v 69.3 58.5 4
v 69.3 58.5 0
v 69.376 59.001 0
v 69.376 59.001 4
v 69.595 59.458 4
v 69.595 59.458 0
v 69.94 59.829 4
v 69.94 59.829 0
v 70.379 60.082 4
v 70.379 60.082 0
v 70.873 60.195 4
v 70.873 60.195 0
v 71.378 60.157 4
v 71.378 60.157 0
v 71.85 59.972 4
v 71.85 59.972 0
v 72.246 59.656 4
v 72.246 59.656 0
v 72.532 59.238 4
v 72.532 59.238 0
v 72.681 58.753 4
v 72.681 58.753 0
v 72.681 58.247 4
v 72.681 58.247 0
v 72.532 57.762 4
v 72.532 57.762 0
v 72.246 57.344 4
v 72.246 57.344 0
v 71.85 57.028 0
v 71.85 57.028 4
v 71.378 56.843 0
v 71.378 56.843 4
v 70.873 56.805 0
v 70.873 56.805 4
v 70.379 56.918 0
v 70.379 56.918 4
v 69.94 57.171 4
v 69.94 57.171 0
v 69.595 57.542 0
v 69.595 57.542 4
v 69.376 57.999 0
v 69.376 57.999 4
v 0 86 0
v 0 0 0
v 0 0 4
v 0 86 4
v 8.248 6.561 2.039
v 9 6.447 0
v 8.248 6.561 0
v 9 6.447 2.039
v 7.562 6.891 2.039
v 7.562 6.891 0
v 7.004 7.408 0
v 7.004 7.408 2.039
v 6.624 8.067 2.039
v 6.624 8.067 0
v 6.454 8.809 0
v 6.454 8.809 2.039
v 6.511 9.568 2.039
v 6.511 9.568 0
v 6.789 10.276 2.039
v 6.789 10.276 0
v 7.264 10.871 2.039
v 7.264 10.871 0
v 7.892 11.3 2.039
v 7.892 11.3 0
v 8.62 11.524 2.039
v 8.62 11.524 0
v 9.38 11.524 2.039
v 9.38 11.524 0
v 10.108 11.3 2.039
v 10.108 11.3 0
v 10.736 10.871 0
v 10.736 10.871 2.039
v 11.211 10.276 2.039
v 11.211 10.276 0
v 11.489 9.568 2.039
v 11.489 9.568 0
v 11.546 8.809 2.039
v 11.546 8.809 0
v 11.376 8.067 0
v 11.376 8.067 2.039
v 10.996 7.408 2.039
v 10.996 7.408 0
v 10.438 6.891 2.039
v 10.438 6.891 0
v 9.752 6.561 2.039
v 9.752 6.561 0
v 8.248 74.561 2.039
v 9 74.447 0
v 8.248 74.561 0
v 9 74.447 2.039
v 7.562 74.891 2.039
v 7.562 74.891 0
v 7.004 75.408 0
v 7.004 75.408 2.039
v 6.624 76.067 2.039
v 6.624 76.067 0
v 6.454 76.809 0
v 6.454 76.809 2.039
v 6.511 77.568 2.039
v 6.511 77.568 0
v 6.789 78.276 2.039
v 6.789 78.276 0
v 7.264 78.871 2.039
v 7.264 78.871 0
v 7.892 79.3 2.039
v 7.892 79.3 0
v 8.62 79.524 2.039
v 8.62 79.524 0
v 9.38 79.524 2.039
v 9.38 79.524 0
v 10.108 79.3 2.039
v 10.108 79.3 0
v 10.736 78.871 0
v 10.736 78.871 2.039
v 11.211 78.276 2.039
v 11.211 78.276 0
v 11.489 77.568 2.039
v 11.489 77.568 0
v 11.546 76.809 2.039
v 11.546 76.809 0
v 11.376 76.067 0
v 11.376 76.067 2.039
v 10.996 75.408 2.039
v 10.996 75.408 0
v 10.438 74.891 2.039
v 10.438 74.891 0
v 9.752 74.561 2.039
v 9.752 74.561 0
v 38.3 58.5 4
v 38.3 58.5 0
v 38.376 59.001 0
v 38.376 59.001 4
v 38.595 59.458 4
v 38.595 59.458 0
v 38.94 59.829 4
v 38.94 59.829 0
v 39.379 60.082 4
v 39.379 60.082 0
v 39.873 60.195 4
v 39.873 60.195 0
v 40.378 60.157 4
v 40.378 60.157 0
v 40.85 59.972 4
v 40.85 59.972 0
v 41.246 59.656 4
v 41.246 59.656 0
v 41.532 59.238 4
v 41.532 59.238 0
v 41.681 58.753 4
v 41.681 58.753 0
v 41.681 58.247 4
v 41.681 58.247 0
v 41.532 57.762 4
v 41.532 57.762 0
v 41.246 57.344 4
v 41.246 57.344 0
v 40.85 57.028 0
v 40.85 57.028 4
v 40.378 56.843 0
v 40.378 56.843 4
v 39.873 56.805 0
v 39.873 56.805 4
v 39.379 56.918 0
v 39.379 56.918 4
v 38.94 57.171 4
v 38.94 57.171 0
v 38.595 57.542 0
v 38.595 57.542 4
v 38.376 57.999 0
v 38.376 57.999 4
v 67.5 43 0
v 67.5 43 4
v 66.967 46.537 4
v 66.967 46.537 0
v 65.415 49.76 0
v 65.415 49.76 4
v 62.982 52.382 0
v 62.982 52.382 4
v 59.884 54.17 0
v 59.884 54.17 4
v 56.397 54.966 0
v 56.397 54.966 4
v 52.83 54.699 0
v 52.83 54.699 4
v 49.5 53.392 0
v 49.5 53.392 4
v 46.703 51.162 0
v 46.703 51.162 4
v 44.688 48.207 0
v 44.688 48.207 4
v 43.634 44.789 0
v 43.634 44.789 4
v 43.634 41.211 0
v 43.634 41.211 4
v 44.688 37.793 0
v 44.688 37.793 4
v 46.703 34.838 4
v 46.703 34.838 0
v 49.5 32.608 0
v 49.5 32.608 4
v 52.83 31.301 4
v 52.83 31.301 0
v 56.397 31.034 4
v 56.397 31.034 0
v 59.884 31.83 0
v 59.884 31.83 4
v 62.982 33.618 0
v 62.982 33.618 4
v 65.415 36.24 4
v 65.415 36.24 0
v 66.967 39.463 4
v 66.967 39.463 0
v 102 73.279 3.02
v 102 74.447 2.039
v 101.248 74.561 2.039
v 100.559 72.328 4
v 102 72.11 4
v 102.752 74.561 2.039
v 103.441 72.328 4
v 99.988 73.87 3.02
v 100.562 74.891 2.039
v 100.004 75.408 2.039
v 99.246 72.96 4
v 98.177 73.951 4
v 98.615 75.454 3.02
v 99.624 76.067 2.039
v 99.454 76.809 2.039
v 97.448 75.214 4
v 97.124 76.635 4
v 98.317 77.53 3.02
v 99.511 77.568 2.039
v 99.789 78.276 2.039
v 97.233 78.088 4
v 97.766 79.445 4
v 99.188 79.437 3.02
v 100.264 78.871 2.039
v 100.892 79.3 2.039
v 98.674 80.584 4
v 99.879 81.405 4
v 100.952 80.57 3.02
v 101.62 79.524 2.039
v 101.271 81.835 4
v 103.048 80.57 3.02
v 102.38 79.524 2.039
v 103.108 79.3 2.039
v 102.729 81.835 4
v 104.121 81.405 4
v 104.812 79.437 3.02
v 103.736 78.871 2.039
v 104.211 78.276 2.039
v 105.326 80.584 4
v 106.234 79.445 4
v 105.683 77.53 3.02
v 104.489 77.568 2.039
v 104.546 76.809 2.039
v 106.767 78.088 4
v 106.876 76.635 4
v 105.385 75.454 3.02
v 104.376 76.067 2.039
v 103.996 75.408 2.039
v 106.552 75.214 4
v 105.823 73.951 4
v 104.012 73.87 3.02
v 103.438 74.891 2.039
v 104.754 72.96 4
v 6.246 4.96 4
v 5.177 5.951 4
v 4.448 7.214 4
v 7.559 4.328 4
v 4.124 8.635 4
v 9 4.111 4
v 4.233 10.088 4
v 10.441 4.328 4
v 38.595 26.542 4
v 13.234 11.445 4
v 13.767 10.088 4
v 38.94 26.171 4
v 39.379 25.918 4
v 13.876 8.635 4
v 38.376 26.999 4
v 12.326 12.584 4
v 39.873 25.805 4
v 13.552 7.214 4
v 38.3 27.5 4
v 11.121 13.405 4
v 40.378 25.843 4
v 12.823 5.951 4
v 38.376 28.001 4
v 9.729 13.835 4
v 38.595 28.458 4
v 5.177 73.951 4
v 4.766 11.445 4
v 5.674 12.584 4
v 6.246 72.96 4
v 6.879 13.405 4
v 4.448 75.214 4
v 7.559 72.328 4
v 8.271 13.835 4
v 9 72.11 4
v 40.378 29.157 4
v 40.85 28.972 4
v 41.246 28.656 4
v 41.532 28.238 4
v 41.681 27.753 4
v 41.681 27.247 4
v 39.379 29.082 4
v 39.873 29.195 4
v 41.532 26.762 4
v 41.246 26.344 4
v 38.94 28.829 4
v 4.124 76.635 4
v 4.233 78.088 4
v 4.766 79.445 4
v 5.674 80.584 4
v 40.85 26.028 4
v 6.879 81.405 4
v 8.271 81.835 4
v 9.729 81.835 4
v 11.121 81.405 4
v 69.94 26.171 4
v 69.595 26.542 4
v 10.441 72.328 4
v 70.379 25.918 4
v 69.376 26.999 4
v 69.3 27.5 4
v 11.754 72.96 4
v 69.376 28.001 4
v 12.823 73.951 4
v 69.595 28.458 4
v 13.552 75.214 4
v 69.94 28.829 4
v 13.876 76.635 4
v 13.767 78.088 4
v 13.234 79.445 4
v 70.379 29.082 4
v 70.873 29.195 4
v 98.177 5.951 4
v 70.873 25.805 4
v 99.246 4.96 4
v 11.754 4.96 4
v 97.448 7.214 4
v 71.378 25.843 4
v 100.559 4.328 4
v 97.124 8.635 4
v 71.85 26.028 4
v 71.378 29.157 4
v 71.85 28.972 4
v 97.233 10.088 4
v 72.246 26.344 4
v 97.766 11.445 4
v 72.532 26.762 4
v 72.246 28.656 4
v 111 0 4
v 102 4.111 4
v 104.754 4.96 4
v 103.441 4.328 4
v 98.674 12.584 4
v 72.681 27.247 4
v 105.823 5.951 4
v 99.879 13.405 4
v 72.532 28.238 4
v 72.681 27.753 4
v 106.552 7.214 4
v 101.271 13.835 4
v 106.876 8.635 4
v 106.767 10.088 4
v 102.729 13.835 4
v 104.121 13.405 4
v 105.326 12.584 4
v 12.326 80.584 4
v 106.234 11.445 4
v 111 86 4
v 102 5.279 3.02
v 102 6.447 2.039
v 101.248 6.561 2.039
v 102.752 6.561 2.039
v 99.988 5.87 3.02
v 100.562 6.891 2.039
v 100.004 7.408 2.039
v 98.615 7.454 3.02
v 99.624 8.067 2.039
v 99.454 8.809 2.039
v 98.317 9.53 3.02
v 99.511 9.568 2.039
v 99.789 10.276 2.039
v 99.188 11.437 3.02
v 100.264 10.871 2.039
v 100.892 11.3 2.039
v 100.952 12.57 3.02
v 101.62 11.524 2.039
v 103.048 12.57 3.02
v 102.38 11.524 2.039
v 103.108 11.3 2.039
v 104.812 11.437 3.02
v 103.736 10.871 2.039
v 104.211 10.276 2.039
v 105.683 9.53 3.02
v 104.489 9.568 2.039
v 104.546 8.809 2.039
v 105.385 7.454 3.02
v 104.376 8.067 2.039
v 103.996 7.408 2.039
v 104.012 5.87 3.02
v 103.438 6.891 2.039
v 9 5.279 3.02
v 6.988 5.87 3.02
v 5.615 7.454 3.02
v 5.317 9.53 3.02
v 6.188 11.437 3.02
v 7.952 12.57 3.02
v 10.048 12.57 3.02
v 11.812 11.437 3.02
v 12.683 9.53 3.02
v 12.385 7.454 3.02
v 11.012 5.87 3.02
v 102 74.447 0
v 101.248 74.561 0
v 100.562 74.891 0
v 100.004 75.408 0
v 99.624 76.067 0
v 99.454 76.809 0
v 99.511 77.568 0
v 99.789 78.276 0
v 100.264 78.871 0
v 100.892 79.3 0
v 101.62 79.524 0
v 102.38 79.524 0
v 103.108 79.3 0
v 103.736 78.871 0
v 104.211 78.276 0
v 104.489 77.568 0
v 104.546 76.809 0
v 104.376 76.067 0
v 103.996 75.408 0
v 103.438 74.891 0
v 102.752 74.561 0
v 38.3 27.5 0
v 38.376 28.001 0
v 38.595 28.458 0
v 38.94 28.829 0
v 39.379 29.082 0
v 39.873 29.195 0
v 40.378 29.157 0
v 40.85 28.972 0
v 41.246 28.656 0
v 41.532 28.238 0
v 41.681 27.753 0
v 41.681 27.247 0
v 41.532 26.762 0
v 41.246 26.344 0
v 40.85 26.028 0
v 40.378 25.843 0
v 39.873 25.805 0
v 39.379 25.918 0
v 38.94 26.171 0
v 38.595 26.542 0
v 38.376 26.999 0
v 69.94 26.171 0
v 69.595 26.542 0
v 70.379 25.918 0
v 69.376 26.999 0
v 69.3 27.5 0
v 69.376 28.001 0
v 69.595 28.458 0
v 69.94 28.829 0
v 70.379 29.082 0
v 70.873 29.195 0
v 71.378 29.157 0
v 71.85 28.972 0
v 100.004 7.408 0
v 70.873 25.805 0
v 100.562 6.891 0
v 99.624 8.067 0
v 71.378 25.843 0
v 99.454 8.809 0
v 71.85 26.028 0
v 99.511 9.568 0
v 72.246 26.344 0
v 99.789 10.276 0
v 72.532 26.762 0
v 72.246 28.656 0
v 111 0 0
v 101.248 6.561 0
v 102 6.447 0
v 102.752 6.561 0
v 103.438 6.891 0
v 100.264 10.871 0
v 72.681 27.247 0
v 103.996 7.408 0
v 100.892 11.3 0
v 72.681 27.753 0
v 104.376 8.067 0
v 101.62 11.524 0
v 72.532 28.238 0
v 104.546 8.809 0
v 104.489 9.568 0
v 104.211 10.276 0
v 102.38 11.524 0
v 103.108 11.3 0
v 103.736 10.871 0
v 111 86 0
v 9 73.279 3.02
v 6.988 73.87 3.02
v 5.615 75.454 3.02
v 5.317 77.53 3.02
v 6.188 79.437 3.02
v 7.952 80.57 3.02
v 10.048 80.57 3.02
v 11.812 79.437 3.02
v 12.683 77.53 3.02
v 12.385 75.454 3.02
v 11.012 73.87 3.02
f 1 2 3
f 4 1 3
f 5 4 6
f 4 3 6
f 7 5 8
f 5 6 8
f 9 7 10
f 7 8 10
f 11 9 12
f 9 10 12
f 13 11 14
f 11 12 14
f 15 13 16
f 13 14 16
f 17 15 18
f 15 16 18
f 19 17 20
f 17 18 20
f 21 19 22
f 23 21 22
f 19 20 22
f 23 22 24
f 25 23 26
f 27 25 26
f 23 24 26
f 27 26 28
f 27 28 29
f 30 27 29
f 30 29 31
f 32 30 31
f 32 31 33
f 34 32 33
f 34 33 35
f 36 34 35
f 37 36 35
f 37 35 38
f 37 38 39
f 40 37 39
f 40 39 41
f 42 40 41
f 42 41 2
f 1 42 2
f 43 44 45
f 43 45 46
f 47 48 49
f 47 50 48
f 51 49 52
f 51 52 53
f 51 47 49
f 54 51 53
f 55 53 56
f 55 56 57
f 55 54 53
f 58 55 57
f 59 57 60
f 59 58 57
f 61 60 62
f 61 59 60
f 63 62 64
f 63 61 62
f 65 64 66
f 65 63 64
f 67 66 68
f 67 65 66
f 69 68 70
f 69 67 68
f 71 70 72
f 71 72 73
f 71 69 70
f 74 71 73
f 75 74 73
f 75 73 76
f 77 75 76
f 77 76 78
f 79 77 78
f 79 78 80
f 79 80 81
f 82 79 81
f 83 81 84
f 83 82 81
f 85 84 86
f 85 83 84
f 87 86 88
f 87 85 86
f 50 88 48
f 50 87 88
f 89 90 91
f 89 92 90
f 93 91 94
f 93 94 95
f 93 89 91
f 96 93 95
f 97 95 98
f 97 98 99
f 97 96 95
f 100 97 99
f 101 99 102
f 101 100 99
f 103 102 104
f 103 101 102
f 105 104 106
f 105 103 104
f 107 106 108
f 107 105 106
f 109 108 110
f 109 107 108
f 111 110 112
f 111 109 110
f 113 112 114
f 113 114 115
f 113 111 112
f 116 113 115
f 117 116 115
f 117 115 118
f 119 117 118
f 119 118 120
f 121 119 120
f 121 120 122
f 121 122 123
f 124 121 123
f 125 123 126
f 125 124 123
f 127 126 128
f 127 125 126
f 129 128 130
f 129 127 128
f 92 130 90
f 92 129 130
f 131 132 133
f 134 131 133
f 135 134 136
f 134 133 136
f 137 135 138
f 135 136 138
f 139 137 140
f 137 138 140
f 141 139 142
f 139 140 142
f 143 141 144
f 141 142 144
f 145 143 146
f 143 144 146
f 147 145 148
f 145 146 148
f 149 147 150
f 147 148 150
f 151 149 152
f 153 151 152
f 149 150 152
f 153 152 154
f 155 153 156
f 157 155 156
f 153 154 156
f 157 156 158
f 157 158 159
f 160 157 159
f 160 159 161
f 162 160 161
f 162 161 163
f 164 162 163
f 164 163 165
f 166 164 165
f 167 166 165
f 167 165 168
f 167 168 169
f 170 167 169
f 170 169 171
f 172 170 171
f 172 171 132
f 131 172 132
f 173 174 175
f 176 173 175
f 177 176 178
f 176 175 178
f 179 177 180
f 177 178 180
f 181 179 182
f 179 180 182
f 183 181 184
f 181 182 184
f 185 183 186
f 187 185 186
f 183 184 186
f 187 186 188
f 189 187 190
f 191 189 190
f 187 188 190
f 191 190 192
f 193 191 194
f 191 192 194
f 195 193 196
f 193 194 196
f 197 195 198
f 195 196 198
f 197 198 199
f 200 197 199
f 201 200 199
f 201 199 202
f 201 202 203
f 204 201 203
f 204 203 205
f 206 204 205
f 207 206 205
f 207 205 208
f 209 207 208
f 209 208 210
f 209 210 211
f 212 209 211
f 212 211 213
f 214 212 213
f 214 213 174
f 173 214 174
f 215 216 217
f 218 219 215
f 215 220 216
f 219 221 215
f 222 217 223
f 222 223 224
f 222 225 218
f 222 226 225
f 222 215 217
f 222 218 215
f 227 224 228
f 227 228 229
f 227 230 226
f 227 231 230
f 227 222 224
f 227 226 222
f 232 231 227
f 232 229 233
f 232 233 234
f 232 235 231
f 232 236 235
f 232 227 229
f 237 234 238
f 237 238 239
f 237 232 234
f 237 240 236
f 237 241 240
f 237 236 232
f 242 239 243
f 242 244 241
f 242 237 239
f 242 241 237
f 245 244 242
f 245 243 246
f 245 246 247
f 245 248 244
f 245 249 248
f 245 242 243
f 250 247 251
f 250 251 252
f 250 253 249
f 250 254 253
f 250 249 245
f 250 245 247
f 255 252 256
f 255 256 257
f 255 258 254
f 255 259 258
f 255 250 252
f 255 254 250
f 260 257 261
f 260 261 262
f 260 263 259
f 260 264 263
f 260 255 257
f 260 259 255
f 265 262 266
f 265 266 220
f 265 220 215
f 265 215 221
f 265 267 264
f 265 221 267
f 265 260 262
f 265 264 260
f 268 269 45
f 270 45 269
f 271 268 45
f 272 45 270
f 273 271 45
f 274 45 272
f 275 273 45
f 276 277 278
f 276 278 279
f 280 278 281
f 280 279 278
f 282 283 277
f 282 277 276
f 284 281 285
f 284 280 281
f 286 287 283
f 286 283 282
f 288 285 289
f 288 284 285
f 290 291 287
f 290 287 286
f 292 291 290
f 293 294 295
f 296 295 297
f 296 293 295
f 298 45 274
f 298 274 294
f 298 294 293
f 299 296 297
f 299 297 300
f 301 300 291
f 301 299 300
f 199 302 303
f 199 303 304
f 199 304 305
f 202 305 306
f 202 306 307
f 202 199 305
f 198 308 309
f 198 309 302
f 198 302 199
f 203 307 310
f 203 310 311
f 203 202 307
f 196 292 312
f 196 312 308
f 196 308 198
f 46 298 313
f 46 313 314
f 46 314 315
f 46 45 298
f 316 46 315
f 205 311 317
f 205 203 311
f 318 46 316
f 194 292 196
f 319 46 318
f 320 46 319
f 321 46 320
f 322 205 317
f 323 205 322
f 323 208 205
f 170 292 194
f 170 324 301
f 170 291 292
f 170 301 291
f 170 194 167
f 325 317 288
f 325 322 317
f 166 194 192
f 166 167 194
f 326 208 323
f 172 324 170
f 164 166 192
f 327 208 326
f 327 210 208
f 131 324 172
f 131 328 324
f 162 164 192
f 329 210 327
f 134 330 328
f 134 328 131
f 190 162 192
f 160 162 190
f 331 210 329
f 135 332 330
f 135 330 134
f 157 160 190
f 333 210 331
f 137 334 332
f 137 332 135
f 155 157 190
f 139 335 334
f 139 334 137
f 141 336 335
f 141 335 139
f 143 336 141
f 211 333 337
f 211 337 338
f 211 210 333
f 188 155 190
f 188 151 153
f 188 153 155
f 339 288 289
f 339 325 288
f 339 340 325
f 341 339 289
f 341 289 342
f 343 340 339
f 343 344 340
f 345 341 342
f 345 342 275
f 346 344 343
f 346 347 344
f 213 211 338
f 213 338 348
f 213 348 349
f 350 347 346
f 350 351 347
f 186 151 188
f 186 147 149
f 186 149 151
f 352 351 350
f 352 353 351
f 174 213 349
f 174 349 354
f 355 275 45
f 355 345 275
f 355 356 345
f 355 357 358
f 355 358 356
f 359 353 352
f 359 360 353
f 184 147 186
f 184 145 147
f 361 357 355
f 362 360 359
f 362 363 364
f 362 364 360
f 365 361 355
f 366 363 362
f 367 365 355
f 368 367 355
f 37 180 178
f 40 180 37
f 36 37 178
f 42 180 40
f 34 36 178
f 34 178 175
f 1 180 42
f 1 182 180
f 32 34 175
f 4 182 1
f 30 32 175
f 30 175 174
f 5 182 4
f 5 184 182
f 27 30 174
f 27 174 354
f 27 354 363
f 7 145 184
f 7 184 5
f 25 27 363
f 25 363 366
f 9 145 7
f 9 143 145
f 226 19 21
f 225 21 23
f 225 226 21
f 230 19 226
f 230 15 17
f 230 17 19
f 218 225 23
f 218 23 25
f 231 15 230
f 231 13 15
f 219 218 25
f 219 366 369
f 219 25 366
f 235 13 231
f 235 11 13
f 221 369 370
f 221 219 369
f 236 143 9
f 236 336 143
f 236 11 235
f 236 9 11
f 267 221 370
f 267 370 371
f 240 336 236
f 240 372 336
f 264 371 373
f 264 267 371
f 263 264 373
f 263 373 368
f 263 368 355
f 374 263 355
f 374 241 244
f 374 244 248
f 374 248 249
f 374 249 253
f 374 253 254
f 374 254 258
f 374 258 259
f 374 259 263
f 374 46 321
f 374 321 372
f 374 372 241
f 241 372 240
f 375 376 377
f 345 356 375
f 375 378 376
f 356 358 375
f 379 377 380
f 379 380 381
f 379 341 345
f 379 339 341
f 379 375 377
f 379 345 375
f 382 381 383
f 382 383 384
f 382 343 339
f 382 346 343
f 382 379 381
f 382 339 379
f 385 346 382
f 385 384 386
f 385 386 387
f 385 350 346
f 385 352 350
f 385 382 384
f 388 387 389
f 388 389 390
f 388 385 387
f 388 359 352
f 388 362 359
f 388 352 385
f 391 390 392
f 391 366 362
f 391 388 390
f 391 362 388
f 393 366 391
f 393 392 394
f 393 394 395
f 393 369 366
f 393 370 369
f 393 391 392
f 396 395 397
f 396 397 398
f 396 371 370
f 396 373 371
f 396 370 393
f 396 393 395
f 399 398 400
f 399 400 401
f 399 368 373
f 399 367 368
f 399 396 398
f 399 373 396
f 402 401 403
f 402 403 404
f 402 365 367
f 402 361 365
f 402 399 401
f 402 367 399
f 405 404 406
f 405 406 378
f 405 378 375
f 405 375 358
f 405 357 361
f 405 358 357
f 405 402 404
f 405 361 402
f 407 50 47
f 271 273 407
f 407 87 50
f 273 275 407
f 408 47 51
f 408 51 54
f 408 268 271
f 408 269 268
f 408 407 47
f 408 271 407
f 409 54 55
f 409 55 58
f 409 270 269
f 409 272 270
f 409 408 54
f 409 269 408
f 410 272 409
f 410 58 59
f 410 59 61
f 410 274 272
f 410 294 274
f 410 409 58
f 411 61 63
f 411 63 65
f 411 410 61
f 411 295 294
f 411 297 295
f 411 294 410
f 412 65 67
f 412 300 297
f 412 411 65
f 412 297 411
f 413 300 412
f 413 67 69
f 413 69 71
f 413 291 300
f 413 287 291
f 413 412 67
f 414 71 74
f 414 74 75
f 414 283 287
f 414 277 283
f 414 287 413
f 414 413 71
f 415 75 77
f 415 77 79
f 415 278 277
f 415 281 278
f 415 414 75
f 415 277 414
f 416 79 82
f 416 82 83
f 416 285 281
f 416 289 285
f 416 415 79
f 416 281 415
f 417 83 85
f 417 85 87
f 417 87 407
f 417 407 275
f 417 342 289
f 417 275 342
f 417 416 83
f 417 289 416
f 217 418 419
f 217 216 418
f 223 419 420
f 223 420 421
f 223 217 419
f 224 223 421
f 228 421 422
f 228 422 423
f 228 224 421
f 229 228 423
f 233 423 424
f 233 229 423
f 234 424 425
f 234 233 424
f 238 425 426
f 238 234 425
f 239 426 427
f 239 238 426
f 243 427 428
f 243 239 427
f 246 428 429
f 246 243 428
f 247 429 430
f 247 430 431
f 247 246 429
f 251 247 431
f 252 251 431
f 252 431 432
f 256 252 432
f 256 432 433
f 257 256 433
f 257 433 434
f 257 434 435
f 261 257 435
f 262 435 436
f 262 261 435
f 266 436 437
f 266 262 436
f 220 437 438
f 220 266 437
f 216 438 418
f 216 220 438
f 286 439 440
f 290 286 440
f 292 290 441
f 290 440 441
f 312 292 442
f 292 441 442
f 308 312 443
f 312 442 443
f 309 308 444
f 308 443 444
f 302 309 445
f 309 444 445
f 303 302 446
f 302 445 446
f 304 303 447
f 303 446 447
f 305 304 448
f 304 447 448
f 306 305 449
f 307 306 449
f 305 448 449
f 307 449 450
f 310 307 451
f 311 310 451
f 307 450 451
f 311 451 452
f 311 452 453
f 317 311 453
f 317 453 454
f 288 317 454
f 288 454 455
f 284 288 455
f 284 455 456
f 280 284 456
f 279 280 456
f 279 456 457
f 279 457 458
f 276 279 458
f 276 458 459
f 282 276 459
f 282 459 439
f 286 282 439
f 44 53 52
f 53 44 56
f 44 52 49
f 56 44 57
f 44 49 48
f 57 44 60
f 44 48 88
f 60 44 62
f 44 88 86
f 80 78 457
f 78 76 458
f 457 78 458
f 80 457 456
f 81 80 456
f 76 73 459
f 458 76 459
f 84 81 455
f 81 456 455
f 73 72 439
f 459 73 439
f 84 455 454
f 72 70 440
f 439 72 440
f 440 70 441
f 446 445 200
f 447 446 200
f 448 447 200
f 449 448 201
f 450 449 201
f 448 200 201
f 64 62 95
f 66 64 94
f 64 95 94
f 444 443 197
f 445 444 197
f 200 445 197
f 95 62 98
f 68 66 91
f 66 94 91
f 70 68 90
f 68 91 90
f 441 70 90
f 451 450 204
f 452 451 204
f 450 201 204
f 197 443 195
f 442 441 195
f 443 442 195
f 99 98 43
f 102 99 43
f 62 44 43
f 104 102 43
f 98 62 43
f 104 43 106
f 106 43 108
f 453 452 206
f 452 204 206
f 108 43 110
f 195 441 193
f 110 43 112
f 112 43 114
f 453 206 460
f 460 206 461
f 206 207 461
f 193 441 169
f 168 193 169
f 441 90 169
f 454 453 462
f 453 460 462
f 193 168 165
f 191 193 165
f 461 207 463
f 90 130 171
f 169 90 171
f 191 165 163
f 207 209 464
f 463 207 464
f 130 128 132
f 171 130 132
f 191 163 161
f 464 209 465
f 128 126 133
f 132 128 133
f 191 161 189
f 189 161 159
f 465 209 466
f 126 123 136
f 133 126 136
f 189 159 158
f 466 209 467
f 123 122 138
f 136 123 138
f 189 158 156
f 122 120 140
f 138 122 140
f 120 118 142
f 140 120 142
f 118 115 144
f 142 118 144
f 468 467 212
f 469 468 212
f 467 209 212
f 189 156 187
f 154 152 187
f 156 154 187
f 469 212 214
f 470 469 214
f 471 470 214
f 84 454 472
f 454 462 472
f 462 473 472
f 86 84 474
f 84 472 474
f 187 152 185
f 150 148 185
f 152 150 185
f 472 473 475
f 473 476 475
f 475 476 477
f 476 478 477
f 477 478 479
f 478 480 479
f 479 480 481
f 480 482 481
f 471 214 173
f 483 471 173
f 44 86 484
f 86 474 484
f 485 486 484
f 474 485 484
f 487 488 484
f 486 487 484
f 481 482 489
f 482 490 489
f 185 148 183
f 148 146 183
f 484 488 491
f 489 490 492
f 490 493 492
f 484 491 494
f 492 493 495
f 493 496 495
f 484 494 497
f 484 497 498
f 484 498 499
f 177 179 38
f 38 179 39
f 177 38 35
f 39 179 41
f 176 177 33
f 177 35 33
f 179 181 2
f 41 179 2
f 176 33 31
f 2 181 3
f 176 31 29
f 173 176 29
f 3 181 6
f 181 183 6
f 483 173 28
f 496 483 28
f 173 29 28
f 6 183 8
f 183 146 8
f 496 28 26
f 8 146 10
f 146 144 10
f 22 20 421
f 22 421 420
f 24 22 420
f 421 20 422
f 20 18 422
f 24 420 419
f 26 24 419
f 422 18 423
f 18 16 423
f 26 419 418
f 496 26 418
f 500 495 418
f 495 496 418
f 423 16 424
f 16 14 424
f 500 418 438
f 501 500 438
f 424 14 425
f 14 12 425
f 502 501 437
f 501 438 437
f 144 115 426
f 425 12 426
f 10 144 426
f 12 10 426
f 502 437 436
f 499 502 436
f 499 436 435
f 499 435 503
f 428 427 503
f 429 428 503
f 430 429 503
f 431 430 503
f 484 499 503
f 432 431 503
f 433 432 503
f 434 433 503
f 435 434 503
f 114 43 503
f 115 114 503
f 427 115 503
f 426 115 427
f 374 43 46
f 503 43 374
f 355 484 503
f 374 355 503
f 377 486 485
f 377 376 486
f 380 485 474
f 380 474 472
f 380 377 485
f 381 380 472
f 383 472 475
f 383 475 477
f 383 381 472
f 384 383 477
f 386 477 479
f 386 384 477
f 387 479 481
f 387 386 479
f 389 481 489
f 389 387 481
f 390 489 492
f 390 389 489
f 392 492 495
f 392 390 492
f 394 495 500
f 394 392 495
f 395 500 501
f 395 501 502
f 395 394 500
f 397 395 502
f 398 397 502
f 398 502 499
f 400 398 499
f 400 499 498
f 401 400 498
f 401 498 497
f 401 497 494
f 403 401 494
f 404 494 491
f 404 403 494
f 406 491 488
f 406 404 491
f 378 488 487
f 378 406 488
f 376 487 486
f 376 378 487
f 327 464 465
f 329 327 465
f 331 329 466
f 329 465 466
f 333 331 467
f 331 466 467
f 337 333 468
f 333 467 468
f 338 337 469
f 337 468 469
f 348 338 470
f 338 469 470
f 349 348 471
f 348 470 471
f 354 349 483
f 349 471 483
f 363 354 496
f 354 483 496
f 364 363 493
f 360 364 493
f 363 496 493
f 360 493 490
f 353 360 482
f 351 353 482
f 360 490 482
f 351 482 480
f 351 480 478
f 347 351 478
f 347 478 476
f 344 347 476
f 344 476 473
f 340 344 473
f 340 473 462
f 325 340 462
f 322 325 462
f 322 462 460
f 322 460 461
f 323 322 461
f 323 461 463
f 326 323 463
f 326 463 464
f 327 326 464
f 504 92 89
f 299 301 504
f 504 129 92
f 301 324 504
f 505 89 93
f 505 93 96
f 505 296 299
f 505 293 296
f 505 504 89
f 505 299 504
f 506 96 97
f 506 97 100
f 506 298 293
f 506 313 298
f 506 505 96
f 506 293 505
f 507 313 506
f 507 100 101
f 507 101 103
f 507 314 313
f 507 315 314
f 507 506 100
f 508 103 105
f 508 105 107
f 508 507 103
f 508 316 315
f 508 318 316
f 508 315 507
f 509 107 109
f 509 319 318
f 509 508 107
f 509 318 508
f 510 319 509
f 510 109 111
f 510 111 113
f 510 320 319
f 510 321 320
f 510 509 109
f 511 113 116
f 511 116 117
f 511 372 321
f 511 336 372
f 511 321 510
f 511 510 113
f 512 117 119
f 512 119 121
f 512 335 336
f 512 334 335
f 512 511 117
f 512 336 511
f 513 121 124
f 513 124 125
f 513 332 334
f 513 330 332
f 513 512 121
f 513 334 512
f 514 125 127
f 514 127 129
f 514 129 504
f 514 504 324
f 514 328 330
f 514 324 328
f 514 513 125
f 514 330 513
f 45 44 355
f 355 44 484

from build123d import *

# Parameters (mm, degrees)
SKETCH1_W                          = 111
SKETCH1_H                          = 86
BASE_DEPTH                         = 4
NEMA_17_SCREW_HOLE_PATTERN_D       = 3.4
SKETCH5_R                          = 12
MOTOR_SHAFT_BOSS_CLEAREANCE_DEPTH  = 141.474196919
WOOD_SCREW_HOLE_PATTERN_AT_2_COUNT = 2
WOOD_SCREW_HOLE_PATTERN_AT_2_PITCH = 115.20850663
WOOD_SCREW_HOLE_PATTERN_AT_3_COUNT = 2
WOOD_SCREW_HOLE_PATTERN_AT_3_PITCH = 68
WOOD_SCREW_HOLE_PATTERN_AT_4_COUNT = 2
WOOD_SCREW_HOLE_PATTERN_AT_4_PITCH = 93


with BuildPart() as part:
    # Sketch1 → base (new body)
    with BuildSketch(Plane.XY):
        with Locations((55.5, 43)):
            Rectangle(SKETCH1_W, SKETCH1_H)
    extrude(amount=BASE_DEPTH)

    # nema 17 screw hole pattern (through all)
    with Locations(Plane.XY.offset(4)):
        with Locations((40, 58.5), (71, 27.5), (40, 27.5), (71, 58.5)):
            Hole(NEMA_17_SCREW_HOLE_PATTERN_D / 2)

    # Sketch5 → motor shaft boss cleareance (cut, through all)
    with BuildSketch(Plane.XY.offset(4)):
        with Locations((55.5, 43)):
            Circle(SKETCH5_R)
    extrude(amount=-MOTOR_SHAFT_BOSS_CLEAREANCE_DEPTH, mode=Mode.SUBTRACT)

    # Sketch7 → wood screw hole pattern (revolve, cut)
    with BuildSketch(Plane(origin=(9, 77, 4), x_dir=(0, -1, 0), z_dir=(1, 0, 0))):
        Polygon((0, 0), (0, 4), (2.5527, 4), (2.5527, 1.960808018), (4.8895, 0), align=None)
    wood_screw_hole_pattern = revolve(axis=Axis((9, 77, 10.35), (0, 0, -1)), mode=Mode.SUBTRACT)

    # wood screw hole pattern at 2: wood screw hole pattern ×2
    with Locations(*[Vector(0.8072320588129593, -0.5902341935406581, 0) * (i * WOOD_SCREW_HOLE_PATTERN_AT_2_PITCH) for i in range(1, WOOD_SCREW_HOLE_PATTERN_AT_2_COUNT)]):
        add(wood_screw_hole_pattern, mode=Mode.SUBTRACT)

    # wood screw hole pattern at 3: wood screw hole pattern ×2
    with Locations(*[(0, -i * WOOD_SCREW_HOLE_PATTERN_AT_3_PITCH, 0) for i in range(1, WOOD_SCREW_HOLE_PATTERN_AT_3_COUNT)]):
        add(wood_screw_hole_pattern, mode=Mode.SUBTRACT)

    # wood screw hole pattern at 4: wood screw hole pattern ×2
    with Locations(*[(i * WOOD_SCREW_HOLE_PATTERN_AT_4_PITCH, 0, 0) for i in range(1, WOOD_SCREW_HOLE_PATTERN_AT_4_COUNT)]):
        add(wood_screw_hole_pattern, mode=Mode.SUBTRACT)


solid = part.part
